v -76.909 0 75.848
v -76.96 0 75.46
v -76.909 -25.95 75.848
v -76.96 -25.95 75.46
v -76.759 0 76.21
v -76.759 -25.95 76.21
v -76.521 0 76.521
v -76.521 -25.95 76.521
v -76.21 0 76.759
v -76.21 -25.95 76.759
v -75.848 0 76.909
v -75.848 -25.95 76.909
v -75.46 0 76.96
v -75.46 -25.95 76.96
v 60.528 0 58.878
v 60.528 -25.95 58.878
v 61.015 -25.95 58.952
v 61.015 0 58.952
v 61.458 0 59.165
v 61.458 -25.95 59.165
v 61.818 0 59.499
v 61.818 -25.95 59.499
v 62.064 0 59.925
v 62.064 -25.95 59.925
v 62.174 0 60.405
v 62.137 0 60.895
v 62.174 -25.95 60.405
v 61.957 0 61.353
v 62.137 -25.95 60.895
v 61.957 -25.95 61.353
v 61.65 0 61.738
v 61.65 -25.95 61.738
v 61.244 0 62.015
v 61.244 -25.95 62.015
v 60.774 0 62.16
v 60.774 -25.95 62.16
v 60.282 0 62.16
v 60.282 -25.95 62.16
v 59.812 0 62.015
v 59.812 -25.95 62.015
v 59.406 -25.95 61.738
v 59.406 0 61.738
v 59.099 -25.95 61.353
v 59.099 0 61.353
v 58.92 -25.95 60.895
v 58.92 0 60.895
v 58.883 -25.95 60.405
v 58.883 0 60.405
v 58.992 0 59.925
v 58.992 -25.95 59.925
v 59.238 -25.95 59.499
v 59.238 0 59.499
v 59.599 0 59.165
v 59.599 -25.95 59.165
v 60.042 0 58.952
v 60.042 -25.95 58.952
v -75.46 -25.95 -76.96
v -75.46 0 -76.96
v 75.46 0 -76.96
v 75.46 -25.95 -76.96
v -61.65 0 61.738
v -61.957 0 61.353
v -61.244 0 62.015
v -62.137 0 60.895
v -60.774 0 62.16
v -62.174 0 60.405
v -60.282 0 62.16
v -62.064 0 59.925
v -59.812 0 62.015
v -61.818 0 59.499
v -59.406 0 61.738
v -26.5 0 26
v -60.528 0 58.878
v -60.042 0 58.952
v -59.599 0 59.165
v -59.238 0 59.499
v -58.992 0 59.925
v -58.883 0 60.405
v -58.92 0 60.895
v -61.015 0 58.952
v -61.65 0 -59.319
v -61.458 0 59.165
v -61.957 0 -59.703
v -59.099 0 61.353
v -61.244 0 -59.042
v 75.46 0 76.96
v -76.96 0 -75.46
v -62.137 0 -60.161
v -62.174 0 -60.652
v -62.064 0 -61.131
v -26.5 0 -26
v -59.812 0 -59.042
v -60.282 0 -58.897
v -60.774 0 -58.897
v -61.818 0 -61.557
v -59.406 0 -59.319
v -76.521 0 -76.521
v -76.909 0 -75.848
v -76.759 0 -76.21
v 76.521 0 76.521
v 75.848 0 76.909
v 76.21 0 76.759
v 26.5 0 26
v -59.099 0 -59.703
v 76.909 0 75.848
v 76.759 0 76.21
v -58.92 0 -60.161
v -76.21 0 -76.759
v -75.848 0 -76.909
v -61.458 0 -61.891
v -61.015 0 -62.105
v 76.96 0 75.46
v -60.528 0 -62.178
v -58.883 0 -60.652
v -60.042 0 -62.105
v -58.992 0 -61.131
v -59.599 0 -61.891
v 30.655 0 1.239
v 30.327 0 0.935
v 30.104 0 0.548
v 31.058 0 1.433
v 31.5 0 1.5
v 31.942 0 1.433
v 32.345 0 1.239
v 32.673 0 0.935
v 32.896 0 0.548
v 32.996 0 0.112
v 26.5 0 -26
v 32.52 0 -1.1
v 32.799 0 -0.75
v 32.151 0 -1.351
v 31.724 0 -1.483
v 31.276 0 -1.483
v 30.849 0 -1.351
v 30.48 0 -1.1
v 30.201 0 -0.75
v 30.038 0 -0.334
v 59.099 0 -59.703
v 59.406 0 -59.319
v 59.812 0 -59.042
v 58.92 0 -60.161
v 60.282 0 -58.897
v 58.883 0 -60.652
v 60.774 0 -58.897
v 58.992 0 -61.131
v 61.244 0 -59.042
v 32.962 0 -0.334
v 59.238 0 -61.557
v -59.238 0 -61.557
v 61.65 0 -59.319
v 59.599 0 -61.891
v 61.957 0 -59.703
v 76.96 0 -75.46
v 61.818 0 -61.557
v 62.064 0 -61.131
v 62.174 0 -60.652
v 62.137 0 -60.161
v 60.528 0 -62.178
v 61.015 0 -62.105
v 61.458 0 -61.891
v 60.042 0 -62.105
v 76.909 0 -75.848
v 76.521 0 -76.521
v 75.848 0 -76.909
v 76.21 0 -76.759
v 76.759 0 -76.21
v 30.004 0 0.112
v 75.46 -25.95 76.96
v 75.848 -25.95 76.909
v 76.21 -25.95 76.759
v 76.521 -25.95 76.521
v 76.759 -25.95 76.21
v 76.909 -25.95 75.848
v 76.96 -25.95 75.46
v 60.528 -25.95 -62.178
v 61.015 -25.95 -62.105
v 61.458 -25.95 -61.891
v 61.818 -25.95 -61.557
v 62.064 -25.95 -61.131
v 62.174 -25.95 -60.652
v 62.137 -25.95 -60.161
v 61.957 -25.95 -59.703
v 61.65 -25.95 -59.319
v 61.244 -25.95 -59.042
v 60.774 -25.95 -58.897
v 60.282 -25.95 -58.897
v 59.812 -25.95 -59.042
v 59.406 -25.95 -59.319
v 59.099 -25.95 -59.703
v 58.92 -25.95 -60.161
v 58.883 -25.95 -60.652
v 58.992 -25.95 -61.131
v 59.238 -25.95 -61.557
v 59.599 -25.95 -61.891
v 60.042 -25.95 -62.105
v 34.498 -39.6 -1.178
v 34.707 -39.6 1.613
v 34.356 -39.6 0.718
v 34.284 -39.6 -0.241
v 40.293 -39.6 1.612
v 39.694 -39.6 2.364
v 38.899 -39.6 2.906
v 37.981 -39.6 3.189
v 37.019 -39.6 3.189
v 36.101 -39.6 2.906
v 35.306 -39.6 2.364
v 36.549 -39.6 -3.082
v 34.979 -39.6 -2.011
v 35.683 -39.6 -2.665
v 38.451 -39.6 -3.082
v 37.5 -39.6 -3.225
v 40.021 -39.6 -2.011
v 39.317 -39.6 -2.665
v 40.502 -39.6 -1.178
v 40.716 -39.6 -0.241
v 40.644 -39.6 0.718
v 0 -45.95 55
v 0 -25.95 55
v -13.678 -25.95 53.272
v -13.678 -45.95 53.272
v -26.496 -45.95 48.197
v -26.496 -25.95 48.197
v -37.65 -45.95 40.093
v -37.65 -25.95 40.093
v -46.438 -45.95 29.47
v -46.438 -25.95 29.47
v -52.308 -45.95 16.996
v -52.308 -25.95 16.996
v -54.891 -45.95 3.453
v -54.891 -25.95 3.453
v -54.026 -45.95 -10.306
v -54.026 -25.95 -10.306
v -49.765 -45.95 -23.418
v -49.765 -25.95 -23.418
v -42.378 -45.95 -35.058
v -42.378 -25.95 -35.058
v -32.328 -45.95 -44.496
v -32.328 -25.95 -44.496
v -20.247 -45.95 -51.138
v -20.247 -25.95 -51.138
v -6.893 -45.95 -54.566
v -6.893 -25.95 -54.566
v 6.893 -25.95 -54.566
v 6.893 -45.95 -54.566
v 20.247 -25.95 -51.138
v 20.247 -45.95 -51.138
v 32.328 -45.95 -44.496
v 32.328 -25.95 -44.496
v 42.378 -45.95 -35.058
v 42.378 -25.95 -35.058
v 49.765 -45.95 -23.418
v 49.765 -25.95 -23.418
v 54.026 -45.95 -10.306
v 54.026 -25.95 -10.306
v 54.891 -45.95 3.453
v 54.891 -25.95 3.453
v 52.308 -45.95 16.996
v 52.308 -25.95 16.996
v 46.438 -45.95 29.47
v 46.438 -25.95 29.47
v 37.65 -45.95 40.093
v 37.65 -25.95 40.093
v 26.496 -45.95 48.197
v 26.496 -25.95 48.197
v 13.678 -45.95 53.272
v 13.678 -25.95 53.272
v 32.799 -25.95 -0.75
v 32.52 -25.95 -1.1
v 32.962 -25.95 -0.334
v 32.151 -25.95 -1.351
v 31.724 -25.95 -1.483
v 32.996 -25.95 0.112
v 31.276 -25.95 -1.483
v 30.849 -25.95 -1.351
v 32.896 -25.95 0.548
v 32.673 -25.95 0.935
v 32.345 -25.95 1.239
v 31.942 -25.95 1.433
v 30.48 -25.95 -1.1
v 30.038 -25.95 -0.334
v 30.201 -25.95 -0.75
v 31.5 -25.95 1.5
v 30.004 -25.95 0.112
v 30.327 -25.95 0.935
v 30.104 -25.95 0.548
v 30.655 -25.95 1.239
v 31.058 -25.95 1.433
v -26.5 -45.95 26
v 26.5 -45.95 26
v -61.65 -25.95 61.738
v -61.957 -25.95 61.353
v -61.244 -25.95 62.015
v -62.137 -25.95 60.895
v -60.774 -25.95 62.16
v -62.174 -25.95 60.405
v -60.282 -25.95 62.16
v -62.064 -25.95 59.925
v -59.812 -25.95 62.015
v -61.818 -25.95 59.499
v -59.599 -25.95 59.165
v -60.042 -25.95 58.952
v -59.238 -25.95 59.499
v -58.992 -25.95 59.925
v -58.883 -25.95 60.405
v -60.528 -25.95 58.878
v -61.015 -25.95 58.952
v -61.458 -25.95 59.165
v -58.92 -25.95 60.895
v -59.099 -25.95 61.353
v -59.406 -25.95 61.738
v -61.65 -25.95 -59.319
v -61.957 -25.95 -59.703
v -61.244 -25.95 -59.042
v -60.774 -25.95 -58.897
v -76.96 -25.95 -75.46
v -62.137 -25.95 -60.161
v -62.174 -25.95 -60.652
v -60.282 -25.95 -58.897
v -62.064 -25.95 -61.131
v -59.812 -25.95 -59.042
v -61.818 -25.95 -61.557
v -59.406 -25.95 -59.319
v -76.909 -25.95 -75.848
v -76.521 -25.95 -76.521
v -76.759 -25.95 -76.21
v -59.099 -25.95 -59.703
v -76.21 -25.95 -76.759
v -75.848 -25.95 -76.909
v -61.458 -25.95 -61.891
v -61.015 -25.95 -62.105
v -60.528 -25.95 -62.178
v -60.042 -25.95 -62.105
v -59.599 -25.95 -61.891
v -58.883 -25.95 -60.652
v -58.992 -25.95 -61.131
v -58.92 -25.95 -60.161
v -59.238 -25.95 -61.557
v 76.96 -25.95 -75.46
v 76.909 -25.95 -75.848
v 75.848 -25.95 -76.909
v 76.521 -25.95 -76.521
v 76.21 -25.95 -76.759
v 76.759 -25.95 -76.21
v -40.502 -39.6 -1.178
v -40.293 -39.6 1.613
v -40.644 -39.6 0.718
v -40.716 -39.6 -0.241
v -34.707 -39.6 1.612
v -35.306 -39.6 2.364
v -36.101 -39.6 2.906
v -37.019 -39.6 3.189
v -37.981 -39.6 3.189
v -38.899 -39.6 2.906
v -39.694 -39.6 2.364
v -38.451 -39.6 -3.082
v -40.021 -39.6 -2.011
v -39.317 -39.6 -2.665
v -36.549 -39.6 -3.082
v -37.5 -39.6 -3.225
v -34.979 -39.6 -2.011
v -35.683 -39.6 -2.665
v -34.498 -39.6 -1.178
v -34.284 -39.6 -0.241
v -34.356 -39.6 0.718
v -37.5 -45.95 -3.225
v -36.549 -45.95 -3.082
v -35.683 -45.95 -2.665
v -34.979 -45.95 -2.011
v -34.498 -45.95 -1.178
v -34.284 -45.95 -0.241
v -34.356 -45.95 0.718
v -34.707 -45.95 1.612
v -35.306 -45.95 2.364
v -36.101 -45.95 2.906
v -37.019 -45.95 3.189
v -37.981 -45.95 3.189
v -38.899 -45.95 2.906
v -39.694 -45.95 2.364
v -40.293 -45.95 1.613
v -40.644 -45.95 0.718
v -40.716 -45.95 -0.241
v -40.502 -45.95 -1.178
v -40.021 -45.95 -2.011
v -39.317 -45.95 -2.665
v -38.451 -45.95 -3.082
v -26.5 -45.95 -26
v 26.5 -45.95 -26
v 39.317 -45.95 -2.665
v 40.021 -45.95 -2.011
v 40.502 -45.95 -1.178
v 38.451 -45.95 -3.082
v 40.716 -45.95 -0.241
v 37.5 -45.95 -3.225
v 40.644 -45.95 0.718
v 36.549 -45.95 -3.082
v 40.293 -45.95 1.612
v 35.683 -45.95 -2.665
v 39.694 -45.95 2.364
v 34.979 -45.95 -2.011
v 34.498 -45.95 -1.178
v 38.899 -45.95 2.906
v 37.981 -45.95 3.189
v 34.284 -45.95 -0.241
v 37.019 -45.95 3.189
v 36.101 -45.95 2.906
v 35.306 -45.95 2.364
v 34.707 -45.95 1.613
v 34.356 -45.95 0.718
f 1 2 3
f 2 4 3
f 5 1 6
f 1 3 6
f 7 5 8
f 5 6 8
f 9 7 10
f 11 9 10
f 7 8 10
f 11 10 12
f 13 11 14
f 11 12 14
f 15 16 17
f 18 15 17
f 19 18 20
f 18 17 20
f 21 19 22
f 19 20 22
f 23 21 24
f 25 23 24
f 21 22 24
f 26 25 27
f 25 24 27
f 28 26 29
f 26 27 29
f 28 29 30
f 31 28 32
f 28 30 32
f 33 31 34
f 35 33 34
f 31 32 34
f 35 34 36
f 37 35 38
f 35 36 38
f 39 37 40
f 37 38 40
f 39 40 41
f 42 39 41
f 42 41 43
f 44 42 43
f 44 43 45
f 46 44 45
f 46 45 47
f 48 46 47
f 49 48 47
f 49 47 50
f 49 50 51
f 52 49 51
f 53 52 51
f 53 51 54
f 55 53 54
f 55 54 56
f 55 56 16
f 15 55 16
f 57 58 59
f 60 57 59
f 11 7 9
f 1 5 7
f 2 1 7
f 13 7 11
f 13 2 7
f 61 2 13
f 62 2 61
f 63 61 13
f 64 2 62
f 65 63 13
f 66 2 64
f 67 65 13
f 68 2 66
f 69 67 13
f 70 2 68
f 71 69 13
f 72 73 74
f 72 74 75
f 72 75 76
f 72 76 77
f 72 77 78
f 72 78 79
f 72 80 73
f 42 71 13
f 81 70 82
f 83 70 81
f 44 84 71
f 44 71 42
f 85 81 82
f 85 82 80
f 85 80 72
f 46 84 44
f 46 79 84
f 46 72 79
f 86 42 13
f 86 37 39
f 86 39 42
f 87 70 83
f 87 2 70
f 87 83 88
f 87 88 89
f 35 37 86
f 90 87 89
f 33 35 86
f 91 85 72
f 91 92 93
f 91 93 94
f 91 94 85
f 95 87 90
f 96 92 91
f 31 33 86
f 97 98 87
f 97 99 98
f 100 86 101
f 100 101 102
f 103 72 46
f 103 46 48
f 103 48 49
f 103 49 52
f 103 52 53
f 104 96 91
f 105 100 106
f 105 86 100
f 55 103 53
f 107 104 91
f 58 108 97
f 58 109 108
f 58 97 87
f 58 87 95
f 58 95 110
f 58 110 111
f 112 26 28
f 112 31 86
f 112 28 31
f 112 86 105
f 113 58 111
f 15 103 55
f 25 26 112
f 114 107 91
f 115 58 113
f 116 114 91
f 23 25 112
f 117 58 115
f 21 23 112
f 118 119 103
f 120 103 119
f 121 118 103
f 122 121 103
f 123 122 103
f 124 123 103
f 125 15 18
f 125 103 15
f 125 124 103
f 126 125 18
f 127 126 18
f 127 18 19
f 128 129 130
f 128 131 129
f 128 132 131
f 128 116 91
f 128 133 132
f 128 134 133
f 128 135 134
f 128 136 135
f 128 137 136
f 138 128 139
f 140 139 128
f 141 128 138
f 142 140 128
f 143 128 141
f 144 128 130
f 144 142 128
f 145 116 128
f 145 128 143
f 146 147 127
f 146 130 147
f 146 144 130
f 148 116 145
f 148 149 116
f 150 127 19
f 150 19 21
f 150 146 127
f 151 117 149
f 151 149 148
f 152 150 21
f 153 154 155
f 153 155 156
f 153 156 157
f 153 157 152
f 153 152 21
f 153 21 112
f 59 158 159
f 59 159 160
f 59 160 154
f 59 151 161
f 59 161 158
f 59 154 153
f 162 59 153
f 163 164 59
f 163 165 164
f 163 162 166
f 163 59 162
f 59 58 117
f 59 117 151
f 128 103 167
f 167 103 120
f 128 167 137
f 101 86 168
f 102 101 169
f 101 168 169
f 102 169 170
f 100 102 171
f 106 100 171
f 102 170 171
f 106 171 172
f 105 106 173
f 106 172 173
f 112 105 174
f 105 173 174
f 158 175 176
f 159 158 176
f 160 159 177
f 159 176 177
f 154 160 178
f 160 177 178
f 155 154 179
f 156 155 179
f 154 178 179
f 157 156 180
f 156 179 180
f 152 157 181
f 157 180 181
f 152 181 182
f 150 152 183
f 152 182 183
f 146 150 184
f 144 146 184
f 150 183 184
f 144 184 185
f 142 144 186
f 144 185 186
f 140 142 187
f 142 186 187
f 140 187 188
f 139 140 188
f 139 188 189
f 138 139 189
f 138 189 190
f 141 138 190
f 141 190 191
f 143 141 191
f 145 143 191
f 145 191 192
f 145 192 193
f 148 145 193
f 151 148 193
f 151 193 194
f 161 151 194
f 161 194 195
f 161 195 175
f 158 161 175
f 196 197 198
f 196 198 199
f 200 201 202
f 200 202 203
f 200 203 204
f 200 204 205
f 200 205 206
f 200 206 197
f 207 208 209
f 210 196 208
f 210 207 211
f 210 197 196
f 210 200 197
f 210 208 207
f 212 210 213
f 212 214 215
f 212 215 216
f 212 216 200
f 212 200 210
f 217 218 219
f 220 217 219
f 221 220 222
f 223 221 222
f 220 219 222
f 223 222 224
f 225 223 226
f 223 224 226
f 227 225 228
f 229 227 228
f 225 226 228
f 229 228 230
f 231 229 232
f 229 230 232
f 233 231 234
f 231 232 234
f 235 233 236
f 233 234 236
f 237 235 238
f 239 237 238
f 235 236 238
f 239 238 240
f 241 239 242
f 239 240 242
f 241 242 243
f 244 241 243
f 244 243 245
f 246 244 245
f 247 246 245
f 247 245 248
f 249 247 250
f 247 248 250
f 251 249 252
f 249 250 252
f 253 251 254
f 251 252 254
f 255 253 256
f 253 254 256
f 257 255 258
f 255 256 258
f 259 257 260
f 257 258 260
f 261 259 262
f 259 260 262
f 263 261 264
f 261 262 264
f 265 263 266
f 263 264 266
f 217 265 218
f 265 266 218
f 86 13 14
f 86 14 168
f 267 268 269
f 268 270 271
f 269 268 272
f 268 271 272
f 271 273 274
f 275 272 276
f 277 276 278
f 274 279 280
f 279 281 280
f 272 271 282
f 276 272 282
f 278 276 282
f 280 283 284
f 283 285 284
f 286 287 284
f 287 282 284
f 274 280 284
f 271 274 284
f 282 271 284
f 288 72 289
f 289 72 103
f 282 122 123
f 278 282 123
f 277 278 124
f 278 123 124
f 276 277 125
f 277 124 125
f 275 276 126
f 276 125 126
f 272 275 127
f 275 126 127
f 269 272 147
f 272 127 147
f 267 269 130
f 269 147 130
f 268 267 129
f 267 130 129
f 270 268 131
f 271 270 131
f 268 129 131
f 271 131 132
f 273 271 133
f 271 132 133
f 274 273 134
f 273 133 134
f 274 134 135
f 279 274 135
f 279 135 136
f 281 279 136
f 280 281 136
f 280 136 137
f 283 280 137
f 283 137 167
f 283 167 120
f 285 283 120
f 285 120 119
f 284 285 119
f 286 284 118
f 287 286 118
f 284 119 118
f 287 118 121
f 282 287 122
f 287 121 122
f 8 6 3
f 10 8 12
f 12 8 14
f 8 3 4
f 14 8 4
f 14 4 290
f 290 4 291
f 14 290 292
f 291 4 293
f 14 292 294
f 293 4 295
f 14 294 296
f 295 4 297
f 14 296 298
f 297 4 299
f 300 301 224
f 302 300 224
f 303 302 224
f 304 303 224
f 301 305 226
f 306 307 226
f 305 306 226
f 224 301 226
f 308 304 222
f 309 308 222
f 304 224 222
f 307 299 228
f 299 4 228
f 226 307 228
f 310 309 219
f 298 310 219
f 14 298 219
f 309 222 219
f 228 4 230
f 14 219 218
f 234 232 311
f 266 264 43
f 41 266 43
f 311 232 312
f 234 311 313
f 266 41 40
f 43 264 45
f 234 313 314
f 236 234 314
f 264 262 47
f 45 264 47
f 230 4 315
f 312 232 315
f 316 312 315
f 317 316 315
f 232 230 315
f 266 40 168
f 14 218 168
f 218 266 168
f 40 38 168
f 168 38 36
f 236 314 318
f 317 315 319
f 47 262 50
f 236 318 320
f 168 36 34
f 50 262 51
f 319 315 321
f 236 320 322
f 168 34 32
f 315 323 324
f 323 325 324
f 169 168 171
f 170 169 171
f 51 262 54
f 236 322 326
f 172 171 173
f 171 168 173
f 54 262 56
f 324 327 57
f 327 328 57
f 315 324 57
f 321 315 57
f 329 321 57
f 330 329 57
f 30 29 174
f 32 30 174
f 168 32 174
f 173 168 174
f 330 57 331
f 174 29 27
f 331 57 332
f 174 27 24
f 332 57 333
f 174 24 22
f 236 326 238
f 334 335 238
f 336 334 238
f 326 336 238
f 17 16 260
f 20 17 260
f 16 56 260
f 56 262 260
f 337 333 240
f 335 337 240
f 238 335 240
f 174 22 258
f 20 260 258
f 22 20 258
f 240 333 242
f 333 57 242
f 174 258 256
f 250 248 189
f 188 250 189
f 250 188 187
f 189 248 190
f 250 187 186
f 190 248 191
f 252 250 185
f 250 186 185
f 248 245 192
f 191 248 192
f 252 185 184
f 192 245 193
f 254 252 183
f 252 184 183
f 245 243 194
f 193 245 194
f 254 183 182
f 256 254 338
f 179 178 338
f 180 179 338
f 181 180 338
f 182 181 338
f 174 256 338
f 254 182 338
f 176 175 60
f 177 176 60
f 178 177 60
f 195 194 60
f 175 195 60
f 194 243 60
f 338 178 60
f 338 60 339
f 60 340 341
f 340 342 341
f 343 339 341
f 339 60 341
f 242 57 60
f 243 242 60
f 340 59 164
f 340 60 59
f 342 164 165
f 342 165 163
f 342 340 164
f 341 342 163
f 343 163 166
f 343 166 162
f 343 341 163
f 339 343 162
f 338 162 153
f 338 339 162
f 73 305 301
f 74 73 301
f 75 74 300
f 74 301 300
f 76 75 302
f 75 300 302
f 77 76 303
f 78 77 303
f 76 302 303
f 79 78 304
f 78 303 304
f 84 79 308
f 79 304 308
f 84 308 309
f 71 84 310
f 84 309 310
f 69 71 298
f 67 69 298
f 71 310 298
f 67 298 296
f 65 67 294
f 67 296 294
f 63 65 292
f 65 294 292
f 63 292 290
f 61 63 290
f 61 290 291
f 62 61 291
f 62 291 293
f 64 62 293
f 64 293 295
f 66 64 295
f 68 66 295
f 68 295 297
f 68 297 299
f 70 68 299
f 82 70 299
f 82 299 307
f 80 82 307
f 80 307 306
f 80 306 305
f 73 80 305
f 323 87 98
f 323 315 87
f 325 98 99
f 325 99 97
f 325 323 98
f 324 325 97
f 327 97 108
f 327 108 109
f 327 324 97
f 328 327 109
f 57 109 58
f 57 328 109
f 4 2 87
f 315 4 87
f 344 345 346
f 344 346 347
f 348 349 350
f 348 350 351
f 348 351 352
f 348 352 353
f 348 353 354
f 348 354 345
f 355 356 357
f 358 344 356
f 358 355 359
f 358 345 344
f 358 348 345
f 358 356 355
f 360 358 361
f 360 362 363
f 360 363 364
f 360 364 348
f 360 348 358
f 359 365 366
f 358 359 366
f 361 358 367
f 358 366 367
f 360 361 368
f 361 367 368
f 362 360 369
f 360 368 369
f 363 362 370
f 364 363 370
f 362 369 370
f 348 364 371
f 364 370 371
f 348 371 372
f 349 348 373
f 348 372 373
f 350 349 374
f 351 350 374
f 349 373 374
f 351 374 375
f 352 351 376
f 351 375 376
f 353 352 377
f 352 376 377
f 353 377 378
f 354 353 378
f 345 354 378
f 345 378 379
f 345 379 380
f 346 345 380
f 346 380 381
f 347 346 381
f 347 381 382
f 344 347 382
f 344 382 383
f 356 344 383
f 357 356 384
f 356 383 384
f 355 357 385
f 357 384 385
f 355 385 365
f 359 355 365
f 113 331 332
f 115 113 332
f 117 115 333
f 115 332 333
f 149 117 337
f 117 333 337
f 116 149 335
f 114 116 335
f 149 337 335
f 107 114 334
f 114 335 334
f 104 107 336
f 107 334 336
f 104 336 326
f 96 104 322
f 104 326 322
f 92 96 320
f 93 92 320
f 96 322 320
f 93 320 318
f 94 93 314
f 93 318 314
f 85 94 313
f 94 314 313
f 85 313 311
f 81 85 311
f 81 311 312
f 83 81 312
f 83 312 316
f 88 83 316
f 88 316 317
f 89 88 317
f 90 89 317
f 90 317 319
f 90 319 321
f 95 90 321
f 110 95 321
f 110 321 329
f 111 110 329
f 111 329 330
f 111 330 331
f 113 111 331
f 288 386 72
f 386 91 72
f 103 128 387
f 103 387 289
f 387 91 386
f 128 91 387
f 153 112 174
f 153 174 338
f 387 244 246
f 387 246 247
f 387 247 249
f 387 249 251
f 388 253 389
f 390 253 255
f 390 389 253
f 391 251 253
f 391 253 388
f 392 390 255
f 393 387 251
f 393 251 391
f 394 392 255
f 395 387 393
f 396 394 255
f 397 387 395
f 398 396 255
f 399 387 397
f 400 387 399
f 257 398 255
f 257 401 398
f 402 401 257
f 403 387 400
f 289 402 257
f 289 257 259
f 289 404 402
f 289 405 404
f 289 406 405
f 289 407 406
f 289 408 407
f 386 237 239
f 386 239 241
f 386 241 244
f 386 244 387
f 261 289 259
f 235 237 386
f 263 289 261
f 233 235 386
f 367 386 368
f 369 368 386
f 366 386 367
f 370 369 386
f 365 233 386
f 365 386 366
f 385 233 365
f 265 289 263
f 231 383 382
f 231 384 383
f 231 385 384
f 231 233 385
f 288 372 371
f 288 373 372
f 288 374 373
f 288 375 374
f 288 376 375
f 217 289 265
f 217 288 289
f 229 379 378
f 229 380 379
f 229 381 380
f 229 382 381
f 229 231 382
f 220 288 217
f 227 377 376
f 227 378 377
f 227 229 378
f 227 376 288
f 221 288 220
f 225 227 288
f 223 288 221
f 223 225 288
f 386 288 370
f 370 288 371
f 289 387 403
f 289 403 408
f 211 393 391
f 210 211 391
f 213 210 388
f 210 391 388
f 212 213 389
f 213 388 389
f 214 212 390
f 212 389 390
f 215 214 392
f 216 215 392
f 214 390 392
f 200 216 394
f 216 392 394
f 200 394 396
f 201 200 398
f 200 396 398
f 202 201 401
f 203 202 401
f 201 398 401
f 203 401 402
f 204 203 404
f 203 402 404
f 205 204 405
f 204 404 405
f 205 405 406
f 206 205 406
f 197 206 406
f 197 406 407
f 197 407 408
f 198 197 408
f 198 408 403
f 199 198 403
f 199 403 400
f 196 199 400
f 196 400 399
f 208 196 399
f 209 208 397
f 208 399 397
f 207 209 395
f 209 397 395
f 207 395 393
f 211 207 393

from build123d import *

# Parameters (mm, degrees)
SKETCH1_W                   = 153.92
SKETCH1_H                   = 153.92
SKETCH1_R                   = 1.5
SKETCH1_W_2                 = 53
SKETCH1_H_2                 = 52
BOSS_EXTRUDE1_DEPTH         = 25.95
TAP_DRILL_FOR_M4X0_7_TAP2_D = 3.3
SKETCH3_R                   = 55
SKETCH3_W                   = 53
SKETCH3_H                   = 52
BOSS_EXTRUDE3_DEPTH         = 20
SKETCH5_R                   = 3.225
CUT_EXTRUDE1_DEPTH          = 6.35
FILLET2_R                   = 1.5


with BuildPart() as part:
    # Sketch1 → Boss-Extrude1 (new body)
    with BuildSketch(Plane(origin=(0, 0, 0), x_dir=(1, 0, 0), z_dir=(0, 1, 0))):
        Rectangle(SKETCH1_W, SKETCH1_H)
        with Locations(Location((31.5, 0, 0), (0, 0, 270))):
            Circle(SKETCH1_R, mode=Mode.SUBTRACT)
        Rectangle(SKETCH1_W_2, SKETCH1_H_2, mode=Mode.SUBTRACT)
    extrude(amount=-BOSS_EXTRUDE1_DEPTH)

    # Tap Drill for M4x0.7 Tap2 (through all)
    with Locations(Plane(origin=(-60.5282, 0, -60.5282), x_dir=(0, 0, 1), z_dir=(0, 1, 0))):
        with Locations((0, 0), (121.0564, 0), (121.0564, 121.0564), (0, 121.0564)):
            Hole(TAP_DRILL_FOR_M4X0_7_TAP2_D / 2)

    # Sketch3 → Boss-Extrude3 (add)
    with BuildSketch(Plane.XZ.offset(25.95)):
        with Locations(Location((0, 0, 0), (0, 0, 90))):
            Circle(SKETCH3_R)
        Rectangle(SKETCH3_W, SKETCH3_H, mode=Mode.SUBTRACT)
    extrude(amount=BOSS_EXTRUDE3_DEPTH)

    # Sketch5 → Cut-Extrude1 (cut)
    with BuildSketch(Plane.XZ.offset(45.95)):
        with Locations(Location((-37.5, 0, 0), (0, 0, 270))):
            Circle(SKETCH5_R)
        with Locations(Location((37.5, 0, 0), (0, 0, 270))):
            Circle(SKETCH5_R)
    extrude(amount=-CUT_EXTRUDE1_DEPTH, mode=Mode.SUBTRACT)

    # Fillet2
    fillet2_edges = [part.edges().sort_by_distance(p)[0] for p in [
        (-76.96, -12.975, 76.96),
        (-76.96, -12.975, -76.96),
        (76.96, -12.975, -76.96),
        (76.96, -12.975, 76.96),
    ]]
    fillet(fillet2_edges, radius=FILLET2_R)


solid = part.part
